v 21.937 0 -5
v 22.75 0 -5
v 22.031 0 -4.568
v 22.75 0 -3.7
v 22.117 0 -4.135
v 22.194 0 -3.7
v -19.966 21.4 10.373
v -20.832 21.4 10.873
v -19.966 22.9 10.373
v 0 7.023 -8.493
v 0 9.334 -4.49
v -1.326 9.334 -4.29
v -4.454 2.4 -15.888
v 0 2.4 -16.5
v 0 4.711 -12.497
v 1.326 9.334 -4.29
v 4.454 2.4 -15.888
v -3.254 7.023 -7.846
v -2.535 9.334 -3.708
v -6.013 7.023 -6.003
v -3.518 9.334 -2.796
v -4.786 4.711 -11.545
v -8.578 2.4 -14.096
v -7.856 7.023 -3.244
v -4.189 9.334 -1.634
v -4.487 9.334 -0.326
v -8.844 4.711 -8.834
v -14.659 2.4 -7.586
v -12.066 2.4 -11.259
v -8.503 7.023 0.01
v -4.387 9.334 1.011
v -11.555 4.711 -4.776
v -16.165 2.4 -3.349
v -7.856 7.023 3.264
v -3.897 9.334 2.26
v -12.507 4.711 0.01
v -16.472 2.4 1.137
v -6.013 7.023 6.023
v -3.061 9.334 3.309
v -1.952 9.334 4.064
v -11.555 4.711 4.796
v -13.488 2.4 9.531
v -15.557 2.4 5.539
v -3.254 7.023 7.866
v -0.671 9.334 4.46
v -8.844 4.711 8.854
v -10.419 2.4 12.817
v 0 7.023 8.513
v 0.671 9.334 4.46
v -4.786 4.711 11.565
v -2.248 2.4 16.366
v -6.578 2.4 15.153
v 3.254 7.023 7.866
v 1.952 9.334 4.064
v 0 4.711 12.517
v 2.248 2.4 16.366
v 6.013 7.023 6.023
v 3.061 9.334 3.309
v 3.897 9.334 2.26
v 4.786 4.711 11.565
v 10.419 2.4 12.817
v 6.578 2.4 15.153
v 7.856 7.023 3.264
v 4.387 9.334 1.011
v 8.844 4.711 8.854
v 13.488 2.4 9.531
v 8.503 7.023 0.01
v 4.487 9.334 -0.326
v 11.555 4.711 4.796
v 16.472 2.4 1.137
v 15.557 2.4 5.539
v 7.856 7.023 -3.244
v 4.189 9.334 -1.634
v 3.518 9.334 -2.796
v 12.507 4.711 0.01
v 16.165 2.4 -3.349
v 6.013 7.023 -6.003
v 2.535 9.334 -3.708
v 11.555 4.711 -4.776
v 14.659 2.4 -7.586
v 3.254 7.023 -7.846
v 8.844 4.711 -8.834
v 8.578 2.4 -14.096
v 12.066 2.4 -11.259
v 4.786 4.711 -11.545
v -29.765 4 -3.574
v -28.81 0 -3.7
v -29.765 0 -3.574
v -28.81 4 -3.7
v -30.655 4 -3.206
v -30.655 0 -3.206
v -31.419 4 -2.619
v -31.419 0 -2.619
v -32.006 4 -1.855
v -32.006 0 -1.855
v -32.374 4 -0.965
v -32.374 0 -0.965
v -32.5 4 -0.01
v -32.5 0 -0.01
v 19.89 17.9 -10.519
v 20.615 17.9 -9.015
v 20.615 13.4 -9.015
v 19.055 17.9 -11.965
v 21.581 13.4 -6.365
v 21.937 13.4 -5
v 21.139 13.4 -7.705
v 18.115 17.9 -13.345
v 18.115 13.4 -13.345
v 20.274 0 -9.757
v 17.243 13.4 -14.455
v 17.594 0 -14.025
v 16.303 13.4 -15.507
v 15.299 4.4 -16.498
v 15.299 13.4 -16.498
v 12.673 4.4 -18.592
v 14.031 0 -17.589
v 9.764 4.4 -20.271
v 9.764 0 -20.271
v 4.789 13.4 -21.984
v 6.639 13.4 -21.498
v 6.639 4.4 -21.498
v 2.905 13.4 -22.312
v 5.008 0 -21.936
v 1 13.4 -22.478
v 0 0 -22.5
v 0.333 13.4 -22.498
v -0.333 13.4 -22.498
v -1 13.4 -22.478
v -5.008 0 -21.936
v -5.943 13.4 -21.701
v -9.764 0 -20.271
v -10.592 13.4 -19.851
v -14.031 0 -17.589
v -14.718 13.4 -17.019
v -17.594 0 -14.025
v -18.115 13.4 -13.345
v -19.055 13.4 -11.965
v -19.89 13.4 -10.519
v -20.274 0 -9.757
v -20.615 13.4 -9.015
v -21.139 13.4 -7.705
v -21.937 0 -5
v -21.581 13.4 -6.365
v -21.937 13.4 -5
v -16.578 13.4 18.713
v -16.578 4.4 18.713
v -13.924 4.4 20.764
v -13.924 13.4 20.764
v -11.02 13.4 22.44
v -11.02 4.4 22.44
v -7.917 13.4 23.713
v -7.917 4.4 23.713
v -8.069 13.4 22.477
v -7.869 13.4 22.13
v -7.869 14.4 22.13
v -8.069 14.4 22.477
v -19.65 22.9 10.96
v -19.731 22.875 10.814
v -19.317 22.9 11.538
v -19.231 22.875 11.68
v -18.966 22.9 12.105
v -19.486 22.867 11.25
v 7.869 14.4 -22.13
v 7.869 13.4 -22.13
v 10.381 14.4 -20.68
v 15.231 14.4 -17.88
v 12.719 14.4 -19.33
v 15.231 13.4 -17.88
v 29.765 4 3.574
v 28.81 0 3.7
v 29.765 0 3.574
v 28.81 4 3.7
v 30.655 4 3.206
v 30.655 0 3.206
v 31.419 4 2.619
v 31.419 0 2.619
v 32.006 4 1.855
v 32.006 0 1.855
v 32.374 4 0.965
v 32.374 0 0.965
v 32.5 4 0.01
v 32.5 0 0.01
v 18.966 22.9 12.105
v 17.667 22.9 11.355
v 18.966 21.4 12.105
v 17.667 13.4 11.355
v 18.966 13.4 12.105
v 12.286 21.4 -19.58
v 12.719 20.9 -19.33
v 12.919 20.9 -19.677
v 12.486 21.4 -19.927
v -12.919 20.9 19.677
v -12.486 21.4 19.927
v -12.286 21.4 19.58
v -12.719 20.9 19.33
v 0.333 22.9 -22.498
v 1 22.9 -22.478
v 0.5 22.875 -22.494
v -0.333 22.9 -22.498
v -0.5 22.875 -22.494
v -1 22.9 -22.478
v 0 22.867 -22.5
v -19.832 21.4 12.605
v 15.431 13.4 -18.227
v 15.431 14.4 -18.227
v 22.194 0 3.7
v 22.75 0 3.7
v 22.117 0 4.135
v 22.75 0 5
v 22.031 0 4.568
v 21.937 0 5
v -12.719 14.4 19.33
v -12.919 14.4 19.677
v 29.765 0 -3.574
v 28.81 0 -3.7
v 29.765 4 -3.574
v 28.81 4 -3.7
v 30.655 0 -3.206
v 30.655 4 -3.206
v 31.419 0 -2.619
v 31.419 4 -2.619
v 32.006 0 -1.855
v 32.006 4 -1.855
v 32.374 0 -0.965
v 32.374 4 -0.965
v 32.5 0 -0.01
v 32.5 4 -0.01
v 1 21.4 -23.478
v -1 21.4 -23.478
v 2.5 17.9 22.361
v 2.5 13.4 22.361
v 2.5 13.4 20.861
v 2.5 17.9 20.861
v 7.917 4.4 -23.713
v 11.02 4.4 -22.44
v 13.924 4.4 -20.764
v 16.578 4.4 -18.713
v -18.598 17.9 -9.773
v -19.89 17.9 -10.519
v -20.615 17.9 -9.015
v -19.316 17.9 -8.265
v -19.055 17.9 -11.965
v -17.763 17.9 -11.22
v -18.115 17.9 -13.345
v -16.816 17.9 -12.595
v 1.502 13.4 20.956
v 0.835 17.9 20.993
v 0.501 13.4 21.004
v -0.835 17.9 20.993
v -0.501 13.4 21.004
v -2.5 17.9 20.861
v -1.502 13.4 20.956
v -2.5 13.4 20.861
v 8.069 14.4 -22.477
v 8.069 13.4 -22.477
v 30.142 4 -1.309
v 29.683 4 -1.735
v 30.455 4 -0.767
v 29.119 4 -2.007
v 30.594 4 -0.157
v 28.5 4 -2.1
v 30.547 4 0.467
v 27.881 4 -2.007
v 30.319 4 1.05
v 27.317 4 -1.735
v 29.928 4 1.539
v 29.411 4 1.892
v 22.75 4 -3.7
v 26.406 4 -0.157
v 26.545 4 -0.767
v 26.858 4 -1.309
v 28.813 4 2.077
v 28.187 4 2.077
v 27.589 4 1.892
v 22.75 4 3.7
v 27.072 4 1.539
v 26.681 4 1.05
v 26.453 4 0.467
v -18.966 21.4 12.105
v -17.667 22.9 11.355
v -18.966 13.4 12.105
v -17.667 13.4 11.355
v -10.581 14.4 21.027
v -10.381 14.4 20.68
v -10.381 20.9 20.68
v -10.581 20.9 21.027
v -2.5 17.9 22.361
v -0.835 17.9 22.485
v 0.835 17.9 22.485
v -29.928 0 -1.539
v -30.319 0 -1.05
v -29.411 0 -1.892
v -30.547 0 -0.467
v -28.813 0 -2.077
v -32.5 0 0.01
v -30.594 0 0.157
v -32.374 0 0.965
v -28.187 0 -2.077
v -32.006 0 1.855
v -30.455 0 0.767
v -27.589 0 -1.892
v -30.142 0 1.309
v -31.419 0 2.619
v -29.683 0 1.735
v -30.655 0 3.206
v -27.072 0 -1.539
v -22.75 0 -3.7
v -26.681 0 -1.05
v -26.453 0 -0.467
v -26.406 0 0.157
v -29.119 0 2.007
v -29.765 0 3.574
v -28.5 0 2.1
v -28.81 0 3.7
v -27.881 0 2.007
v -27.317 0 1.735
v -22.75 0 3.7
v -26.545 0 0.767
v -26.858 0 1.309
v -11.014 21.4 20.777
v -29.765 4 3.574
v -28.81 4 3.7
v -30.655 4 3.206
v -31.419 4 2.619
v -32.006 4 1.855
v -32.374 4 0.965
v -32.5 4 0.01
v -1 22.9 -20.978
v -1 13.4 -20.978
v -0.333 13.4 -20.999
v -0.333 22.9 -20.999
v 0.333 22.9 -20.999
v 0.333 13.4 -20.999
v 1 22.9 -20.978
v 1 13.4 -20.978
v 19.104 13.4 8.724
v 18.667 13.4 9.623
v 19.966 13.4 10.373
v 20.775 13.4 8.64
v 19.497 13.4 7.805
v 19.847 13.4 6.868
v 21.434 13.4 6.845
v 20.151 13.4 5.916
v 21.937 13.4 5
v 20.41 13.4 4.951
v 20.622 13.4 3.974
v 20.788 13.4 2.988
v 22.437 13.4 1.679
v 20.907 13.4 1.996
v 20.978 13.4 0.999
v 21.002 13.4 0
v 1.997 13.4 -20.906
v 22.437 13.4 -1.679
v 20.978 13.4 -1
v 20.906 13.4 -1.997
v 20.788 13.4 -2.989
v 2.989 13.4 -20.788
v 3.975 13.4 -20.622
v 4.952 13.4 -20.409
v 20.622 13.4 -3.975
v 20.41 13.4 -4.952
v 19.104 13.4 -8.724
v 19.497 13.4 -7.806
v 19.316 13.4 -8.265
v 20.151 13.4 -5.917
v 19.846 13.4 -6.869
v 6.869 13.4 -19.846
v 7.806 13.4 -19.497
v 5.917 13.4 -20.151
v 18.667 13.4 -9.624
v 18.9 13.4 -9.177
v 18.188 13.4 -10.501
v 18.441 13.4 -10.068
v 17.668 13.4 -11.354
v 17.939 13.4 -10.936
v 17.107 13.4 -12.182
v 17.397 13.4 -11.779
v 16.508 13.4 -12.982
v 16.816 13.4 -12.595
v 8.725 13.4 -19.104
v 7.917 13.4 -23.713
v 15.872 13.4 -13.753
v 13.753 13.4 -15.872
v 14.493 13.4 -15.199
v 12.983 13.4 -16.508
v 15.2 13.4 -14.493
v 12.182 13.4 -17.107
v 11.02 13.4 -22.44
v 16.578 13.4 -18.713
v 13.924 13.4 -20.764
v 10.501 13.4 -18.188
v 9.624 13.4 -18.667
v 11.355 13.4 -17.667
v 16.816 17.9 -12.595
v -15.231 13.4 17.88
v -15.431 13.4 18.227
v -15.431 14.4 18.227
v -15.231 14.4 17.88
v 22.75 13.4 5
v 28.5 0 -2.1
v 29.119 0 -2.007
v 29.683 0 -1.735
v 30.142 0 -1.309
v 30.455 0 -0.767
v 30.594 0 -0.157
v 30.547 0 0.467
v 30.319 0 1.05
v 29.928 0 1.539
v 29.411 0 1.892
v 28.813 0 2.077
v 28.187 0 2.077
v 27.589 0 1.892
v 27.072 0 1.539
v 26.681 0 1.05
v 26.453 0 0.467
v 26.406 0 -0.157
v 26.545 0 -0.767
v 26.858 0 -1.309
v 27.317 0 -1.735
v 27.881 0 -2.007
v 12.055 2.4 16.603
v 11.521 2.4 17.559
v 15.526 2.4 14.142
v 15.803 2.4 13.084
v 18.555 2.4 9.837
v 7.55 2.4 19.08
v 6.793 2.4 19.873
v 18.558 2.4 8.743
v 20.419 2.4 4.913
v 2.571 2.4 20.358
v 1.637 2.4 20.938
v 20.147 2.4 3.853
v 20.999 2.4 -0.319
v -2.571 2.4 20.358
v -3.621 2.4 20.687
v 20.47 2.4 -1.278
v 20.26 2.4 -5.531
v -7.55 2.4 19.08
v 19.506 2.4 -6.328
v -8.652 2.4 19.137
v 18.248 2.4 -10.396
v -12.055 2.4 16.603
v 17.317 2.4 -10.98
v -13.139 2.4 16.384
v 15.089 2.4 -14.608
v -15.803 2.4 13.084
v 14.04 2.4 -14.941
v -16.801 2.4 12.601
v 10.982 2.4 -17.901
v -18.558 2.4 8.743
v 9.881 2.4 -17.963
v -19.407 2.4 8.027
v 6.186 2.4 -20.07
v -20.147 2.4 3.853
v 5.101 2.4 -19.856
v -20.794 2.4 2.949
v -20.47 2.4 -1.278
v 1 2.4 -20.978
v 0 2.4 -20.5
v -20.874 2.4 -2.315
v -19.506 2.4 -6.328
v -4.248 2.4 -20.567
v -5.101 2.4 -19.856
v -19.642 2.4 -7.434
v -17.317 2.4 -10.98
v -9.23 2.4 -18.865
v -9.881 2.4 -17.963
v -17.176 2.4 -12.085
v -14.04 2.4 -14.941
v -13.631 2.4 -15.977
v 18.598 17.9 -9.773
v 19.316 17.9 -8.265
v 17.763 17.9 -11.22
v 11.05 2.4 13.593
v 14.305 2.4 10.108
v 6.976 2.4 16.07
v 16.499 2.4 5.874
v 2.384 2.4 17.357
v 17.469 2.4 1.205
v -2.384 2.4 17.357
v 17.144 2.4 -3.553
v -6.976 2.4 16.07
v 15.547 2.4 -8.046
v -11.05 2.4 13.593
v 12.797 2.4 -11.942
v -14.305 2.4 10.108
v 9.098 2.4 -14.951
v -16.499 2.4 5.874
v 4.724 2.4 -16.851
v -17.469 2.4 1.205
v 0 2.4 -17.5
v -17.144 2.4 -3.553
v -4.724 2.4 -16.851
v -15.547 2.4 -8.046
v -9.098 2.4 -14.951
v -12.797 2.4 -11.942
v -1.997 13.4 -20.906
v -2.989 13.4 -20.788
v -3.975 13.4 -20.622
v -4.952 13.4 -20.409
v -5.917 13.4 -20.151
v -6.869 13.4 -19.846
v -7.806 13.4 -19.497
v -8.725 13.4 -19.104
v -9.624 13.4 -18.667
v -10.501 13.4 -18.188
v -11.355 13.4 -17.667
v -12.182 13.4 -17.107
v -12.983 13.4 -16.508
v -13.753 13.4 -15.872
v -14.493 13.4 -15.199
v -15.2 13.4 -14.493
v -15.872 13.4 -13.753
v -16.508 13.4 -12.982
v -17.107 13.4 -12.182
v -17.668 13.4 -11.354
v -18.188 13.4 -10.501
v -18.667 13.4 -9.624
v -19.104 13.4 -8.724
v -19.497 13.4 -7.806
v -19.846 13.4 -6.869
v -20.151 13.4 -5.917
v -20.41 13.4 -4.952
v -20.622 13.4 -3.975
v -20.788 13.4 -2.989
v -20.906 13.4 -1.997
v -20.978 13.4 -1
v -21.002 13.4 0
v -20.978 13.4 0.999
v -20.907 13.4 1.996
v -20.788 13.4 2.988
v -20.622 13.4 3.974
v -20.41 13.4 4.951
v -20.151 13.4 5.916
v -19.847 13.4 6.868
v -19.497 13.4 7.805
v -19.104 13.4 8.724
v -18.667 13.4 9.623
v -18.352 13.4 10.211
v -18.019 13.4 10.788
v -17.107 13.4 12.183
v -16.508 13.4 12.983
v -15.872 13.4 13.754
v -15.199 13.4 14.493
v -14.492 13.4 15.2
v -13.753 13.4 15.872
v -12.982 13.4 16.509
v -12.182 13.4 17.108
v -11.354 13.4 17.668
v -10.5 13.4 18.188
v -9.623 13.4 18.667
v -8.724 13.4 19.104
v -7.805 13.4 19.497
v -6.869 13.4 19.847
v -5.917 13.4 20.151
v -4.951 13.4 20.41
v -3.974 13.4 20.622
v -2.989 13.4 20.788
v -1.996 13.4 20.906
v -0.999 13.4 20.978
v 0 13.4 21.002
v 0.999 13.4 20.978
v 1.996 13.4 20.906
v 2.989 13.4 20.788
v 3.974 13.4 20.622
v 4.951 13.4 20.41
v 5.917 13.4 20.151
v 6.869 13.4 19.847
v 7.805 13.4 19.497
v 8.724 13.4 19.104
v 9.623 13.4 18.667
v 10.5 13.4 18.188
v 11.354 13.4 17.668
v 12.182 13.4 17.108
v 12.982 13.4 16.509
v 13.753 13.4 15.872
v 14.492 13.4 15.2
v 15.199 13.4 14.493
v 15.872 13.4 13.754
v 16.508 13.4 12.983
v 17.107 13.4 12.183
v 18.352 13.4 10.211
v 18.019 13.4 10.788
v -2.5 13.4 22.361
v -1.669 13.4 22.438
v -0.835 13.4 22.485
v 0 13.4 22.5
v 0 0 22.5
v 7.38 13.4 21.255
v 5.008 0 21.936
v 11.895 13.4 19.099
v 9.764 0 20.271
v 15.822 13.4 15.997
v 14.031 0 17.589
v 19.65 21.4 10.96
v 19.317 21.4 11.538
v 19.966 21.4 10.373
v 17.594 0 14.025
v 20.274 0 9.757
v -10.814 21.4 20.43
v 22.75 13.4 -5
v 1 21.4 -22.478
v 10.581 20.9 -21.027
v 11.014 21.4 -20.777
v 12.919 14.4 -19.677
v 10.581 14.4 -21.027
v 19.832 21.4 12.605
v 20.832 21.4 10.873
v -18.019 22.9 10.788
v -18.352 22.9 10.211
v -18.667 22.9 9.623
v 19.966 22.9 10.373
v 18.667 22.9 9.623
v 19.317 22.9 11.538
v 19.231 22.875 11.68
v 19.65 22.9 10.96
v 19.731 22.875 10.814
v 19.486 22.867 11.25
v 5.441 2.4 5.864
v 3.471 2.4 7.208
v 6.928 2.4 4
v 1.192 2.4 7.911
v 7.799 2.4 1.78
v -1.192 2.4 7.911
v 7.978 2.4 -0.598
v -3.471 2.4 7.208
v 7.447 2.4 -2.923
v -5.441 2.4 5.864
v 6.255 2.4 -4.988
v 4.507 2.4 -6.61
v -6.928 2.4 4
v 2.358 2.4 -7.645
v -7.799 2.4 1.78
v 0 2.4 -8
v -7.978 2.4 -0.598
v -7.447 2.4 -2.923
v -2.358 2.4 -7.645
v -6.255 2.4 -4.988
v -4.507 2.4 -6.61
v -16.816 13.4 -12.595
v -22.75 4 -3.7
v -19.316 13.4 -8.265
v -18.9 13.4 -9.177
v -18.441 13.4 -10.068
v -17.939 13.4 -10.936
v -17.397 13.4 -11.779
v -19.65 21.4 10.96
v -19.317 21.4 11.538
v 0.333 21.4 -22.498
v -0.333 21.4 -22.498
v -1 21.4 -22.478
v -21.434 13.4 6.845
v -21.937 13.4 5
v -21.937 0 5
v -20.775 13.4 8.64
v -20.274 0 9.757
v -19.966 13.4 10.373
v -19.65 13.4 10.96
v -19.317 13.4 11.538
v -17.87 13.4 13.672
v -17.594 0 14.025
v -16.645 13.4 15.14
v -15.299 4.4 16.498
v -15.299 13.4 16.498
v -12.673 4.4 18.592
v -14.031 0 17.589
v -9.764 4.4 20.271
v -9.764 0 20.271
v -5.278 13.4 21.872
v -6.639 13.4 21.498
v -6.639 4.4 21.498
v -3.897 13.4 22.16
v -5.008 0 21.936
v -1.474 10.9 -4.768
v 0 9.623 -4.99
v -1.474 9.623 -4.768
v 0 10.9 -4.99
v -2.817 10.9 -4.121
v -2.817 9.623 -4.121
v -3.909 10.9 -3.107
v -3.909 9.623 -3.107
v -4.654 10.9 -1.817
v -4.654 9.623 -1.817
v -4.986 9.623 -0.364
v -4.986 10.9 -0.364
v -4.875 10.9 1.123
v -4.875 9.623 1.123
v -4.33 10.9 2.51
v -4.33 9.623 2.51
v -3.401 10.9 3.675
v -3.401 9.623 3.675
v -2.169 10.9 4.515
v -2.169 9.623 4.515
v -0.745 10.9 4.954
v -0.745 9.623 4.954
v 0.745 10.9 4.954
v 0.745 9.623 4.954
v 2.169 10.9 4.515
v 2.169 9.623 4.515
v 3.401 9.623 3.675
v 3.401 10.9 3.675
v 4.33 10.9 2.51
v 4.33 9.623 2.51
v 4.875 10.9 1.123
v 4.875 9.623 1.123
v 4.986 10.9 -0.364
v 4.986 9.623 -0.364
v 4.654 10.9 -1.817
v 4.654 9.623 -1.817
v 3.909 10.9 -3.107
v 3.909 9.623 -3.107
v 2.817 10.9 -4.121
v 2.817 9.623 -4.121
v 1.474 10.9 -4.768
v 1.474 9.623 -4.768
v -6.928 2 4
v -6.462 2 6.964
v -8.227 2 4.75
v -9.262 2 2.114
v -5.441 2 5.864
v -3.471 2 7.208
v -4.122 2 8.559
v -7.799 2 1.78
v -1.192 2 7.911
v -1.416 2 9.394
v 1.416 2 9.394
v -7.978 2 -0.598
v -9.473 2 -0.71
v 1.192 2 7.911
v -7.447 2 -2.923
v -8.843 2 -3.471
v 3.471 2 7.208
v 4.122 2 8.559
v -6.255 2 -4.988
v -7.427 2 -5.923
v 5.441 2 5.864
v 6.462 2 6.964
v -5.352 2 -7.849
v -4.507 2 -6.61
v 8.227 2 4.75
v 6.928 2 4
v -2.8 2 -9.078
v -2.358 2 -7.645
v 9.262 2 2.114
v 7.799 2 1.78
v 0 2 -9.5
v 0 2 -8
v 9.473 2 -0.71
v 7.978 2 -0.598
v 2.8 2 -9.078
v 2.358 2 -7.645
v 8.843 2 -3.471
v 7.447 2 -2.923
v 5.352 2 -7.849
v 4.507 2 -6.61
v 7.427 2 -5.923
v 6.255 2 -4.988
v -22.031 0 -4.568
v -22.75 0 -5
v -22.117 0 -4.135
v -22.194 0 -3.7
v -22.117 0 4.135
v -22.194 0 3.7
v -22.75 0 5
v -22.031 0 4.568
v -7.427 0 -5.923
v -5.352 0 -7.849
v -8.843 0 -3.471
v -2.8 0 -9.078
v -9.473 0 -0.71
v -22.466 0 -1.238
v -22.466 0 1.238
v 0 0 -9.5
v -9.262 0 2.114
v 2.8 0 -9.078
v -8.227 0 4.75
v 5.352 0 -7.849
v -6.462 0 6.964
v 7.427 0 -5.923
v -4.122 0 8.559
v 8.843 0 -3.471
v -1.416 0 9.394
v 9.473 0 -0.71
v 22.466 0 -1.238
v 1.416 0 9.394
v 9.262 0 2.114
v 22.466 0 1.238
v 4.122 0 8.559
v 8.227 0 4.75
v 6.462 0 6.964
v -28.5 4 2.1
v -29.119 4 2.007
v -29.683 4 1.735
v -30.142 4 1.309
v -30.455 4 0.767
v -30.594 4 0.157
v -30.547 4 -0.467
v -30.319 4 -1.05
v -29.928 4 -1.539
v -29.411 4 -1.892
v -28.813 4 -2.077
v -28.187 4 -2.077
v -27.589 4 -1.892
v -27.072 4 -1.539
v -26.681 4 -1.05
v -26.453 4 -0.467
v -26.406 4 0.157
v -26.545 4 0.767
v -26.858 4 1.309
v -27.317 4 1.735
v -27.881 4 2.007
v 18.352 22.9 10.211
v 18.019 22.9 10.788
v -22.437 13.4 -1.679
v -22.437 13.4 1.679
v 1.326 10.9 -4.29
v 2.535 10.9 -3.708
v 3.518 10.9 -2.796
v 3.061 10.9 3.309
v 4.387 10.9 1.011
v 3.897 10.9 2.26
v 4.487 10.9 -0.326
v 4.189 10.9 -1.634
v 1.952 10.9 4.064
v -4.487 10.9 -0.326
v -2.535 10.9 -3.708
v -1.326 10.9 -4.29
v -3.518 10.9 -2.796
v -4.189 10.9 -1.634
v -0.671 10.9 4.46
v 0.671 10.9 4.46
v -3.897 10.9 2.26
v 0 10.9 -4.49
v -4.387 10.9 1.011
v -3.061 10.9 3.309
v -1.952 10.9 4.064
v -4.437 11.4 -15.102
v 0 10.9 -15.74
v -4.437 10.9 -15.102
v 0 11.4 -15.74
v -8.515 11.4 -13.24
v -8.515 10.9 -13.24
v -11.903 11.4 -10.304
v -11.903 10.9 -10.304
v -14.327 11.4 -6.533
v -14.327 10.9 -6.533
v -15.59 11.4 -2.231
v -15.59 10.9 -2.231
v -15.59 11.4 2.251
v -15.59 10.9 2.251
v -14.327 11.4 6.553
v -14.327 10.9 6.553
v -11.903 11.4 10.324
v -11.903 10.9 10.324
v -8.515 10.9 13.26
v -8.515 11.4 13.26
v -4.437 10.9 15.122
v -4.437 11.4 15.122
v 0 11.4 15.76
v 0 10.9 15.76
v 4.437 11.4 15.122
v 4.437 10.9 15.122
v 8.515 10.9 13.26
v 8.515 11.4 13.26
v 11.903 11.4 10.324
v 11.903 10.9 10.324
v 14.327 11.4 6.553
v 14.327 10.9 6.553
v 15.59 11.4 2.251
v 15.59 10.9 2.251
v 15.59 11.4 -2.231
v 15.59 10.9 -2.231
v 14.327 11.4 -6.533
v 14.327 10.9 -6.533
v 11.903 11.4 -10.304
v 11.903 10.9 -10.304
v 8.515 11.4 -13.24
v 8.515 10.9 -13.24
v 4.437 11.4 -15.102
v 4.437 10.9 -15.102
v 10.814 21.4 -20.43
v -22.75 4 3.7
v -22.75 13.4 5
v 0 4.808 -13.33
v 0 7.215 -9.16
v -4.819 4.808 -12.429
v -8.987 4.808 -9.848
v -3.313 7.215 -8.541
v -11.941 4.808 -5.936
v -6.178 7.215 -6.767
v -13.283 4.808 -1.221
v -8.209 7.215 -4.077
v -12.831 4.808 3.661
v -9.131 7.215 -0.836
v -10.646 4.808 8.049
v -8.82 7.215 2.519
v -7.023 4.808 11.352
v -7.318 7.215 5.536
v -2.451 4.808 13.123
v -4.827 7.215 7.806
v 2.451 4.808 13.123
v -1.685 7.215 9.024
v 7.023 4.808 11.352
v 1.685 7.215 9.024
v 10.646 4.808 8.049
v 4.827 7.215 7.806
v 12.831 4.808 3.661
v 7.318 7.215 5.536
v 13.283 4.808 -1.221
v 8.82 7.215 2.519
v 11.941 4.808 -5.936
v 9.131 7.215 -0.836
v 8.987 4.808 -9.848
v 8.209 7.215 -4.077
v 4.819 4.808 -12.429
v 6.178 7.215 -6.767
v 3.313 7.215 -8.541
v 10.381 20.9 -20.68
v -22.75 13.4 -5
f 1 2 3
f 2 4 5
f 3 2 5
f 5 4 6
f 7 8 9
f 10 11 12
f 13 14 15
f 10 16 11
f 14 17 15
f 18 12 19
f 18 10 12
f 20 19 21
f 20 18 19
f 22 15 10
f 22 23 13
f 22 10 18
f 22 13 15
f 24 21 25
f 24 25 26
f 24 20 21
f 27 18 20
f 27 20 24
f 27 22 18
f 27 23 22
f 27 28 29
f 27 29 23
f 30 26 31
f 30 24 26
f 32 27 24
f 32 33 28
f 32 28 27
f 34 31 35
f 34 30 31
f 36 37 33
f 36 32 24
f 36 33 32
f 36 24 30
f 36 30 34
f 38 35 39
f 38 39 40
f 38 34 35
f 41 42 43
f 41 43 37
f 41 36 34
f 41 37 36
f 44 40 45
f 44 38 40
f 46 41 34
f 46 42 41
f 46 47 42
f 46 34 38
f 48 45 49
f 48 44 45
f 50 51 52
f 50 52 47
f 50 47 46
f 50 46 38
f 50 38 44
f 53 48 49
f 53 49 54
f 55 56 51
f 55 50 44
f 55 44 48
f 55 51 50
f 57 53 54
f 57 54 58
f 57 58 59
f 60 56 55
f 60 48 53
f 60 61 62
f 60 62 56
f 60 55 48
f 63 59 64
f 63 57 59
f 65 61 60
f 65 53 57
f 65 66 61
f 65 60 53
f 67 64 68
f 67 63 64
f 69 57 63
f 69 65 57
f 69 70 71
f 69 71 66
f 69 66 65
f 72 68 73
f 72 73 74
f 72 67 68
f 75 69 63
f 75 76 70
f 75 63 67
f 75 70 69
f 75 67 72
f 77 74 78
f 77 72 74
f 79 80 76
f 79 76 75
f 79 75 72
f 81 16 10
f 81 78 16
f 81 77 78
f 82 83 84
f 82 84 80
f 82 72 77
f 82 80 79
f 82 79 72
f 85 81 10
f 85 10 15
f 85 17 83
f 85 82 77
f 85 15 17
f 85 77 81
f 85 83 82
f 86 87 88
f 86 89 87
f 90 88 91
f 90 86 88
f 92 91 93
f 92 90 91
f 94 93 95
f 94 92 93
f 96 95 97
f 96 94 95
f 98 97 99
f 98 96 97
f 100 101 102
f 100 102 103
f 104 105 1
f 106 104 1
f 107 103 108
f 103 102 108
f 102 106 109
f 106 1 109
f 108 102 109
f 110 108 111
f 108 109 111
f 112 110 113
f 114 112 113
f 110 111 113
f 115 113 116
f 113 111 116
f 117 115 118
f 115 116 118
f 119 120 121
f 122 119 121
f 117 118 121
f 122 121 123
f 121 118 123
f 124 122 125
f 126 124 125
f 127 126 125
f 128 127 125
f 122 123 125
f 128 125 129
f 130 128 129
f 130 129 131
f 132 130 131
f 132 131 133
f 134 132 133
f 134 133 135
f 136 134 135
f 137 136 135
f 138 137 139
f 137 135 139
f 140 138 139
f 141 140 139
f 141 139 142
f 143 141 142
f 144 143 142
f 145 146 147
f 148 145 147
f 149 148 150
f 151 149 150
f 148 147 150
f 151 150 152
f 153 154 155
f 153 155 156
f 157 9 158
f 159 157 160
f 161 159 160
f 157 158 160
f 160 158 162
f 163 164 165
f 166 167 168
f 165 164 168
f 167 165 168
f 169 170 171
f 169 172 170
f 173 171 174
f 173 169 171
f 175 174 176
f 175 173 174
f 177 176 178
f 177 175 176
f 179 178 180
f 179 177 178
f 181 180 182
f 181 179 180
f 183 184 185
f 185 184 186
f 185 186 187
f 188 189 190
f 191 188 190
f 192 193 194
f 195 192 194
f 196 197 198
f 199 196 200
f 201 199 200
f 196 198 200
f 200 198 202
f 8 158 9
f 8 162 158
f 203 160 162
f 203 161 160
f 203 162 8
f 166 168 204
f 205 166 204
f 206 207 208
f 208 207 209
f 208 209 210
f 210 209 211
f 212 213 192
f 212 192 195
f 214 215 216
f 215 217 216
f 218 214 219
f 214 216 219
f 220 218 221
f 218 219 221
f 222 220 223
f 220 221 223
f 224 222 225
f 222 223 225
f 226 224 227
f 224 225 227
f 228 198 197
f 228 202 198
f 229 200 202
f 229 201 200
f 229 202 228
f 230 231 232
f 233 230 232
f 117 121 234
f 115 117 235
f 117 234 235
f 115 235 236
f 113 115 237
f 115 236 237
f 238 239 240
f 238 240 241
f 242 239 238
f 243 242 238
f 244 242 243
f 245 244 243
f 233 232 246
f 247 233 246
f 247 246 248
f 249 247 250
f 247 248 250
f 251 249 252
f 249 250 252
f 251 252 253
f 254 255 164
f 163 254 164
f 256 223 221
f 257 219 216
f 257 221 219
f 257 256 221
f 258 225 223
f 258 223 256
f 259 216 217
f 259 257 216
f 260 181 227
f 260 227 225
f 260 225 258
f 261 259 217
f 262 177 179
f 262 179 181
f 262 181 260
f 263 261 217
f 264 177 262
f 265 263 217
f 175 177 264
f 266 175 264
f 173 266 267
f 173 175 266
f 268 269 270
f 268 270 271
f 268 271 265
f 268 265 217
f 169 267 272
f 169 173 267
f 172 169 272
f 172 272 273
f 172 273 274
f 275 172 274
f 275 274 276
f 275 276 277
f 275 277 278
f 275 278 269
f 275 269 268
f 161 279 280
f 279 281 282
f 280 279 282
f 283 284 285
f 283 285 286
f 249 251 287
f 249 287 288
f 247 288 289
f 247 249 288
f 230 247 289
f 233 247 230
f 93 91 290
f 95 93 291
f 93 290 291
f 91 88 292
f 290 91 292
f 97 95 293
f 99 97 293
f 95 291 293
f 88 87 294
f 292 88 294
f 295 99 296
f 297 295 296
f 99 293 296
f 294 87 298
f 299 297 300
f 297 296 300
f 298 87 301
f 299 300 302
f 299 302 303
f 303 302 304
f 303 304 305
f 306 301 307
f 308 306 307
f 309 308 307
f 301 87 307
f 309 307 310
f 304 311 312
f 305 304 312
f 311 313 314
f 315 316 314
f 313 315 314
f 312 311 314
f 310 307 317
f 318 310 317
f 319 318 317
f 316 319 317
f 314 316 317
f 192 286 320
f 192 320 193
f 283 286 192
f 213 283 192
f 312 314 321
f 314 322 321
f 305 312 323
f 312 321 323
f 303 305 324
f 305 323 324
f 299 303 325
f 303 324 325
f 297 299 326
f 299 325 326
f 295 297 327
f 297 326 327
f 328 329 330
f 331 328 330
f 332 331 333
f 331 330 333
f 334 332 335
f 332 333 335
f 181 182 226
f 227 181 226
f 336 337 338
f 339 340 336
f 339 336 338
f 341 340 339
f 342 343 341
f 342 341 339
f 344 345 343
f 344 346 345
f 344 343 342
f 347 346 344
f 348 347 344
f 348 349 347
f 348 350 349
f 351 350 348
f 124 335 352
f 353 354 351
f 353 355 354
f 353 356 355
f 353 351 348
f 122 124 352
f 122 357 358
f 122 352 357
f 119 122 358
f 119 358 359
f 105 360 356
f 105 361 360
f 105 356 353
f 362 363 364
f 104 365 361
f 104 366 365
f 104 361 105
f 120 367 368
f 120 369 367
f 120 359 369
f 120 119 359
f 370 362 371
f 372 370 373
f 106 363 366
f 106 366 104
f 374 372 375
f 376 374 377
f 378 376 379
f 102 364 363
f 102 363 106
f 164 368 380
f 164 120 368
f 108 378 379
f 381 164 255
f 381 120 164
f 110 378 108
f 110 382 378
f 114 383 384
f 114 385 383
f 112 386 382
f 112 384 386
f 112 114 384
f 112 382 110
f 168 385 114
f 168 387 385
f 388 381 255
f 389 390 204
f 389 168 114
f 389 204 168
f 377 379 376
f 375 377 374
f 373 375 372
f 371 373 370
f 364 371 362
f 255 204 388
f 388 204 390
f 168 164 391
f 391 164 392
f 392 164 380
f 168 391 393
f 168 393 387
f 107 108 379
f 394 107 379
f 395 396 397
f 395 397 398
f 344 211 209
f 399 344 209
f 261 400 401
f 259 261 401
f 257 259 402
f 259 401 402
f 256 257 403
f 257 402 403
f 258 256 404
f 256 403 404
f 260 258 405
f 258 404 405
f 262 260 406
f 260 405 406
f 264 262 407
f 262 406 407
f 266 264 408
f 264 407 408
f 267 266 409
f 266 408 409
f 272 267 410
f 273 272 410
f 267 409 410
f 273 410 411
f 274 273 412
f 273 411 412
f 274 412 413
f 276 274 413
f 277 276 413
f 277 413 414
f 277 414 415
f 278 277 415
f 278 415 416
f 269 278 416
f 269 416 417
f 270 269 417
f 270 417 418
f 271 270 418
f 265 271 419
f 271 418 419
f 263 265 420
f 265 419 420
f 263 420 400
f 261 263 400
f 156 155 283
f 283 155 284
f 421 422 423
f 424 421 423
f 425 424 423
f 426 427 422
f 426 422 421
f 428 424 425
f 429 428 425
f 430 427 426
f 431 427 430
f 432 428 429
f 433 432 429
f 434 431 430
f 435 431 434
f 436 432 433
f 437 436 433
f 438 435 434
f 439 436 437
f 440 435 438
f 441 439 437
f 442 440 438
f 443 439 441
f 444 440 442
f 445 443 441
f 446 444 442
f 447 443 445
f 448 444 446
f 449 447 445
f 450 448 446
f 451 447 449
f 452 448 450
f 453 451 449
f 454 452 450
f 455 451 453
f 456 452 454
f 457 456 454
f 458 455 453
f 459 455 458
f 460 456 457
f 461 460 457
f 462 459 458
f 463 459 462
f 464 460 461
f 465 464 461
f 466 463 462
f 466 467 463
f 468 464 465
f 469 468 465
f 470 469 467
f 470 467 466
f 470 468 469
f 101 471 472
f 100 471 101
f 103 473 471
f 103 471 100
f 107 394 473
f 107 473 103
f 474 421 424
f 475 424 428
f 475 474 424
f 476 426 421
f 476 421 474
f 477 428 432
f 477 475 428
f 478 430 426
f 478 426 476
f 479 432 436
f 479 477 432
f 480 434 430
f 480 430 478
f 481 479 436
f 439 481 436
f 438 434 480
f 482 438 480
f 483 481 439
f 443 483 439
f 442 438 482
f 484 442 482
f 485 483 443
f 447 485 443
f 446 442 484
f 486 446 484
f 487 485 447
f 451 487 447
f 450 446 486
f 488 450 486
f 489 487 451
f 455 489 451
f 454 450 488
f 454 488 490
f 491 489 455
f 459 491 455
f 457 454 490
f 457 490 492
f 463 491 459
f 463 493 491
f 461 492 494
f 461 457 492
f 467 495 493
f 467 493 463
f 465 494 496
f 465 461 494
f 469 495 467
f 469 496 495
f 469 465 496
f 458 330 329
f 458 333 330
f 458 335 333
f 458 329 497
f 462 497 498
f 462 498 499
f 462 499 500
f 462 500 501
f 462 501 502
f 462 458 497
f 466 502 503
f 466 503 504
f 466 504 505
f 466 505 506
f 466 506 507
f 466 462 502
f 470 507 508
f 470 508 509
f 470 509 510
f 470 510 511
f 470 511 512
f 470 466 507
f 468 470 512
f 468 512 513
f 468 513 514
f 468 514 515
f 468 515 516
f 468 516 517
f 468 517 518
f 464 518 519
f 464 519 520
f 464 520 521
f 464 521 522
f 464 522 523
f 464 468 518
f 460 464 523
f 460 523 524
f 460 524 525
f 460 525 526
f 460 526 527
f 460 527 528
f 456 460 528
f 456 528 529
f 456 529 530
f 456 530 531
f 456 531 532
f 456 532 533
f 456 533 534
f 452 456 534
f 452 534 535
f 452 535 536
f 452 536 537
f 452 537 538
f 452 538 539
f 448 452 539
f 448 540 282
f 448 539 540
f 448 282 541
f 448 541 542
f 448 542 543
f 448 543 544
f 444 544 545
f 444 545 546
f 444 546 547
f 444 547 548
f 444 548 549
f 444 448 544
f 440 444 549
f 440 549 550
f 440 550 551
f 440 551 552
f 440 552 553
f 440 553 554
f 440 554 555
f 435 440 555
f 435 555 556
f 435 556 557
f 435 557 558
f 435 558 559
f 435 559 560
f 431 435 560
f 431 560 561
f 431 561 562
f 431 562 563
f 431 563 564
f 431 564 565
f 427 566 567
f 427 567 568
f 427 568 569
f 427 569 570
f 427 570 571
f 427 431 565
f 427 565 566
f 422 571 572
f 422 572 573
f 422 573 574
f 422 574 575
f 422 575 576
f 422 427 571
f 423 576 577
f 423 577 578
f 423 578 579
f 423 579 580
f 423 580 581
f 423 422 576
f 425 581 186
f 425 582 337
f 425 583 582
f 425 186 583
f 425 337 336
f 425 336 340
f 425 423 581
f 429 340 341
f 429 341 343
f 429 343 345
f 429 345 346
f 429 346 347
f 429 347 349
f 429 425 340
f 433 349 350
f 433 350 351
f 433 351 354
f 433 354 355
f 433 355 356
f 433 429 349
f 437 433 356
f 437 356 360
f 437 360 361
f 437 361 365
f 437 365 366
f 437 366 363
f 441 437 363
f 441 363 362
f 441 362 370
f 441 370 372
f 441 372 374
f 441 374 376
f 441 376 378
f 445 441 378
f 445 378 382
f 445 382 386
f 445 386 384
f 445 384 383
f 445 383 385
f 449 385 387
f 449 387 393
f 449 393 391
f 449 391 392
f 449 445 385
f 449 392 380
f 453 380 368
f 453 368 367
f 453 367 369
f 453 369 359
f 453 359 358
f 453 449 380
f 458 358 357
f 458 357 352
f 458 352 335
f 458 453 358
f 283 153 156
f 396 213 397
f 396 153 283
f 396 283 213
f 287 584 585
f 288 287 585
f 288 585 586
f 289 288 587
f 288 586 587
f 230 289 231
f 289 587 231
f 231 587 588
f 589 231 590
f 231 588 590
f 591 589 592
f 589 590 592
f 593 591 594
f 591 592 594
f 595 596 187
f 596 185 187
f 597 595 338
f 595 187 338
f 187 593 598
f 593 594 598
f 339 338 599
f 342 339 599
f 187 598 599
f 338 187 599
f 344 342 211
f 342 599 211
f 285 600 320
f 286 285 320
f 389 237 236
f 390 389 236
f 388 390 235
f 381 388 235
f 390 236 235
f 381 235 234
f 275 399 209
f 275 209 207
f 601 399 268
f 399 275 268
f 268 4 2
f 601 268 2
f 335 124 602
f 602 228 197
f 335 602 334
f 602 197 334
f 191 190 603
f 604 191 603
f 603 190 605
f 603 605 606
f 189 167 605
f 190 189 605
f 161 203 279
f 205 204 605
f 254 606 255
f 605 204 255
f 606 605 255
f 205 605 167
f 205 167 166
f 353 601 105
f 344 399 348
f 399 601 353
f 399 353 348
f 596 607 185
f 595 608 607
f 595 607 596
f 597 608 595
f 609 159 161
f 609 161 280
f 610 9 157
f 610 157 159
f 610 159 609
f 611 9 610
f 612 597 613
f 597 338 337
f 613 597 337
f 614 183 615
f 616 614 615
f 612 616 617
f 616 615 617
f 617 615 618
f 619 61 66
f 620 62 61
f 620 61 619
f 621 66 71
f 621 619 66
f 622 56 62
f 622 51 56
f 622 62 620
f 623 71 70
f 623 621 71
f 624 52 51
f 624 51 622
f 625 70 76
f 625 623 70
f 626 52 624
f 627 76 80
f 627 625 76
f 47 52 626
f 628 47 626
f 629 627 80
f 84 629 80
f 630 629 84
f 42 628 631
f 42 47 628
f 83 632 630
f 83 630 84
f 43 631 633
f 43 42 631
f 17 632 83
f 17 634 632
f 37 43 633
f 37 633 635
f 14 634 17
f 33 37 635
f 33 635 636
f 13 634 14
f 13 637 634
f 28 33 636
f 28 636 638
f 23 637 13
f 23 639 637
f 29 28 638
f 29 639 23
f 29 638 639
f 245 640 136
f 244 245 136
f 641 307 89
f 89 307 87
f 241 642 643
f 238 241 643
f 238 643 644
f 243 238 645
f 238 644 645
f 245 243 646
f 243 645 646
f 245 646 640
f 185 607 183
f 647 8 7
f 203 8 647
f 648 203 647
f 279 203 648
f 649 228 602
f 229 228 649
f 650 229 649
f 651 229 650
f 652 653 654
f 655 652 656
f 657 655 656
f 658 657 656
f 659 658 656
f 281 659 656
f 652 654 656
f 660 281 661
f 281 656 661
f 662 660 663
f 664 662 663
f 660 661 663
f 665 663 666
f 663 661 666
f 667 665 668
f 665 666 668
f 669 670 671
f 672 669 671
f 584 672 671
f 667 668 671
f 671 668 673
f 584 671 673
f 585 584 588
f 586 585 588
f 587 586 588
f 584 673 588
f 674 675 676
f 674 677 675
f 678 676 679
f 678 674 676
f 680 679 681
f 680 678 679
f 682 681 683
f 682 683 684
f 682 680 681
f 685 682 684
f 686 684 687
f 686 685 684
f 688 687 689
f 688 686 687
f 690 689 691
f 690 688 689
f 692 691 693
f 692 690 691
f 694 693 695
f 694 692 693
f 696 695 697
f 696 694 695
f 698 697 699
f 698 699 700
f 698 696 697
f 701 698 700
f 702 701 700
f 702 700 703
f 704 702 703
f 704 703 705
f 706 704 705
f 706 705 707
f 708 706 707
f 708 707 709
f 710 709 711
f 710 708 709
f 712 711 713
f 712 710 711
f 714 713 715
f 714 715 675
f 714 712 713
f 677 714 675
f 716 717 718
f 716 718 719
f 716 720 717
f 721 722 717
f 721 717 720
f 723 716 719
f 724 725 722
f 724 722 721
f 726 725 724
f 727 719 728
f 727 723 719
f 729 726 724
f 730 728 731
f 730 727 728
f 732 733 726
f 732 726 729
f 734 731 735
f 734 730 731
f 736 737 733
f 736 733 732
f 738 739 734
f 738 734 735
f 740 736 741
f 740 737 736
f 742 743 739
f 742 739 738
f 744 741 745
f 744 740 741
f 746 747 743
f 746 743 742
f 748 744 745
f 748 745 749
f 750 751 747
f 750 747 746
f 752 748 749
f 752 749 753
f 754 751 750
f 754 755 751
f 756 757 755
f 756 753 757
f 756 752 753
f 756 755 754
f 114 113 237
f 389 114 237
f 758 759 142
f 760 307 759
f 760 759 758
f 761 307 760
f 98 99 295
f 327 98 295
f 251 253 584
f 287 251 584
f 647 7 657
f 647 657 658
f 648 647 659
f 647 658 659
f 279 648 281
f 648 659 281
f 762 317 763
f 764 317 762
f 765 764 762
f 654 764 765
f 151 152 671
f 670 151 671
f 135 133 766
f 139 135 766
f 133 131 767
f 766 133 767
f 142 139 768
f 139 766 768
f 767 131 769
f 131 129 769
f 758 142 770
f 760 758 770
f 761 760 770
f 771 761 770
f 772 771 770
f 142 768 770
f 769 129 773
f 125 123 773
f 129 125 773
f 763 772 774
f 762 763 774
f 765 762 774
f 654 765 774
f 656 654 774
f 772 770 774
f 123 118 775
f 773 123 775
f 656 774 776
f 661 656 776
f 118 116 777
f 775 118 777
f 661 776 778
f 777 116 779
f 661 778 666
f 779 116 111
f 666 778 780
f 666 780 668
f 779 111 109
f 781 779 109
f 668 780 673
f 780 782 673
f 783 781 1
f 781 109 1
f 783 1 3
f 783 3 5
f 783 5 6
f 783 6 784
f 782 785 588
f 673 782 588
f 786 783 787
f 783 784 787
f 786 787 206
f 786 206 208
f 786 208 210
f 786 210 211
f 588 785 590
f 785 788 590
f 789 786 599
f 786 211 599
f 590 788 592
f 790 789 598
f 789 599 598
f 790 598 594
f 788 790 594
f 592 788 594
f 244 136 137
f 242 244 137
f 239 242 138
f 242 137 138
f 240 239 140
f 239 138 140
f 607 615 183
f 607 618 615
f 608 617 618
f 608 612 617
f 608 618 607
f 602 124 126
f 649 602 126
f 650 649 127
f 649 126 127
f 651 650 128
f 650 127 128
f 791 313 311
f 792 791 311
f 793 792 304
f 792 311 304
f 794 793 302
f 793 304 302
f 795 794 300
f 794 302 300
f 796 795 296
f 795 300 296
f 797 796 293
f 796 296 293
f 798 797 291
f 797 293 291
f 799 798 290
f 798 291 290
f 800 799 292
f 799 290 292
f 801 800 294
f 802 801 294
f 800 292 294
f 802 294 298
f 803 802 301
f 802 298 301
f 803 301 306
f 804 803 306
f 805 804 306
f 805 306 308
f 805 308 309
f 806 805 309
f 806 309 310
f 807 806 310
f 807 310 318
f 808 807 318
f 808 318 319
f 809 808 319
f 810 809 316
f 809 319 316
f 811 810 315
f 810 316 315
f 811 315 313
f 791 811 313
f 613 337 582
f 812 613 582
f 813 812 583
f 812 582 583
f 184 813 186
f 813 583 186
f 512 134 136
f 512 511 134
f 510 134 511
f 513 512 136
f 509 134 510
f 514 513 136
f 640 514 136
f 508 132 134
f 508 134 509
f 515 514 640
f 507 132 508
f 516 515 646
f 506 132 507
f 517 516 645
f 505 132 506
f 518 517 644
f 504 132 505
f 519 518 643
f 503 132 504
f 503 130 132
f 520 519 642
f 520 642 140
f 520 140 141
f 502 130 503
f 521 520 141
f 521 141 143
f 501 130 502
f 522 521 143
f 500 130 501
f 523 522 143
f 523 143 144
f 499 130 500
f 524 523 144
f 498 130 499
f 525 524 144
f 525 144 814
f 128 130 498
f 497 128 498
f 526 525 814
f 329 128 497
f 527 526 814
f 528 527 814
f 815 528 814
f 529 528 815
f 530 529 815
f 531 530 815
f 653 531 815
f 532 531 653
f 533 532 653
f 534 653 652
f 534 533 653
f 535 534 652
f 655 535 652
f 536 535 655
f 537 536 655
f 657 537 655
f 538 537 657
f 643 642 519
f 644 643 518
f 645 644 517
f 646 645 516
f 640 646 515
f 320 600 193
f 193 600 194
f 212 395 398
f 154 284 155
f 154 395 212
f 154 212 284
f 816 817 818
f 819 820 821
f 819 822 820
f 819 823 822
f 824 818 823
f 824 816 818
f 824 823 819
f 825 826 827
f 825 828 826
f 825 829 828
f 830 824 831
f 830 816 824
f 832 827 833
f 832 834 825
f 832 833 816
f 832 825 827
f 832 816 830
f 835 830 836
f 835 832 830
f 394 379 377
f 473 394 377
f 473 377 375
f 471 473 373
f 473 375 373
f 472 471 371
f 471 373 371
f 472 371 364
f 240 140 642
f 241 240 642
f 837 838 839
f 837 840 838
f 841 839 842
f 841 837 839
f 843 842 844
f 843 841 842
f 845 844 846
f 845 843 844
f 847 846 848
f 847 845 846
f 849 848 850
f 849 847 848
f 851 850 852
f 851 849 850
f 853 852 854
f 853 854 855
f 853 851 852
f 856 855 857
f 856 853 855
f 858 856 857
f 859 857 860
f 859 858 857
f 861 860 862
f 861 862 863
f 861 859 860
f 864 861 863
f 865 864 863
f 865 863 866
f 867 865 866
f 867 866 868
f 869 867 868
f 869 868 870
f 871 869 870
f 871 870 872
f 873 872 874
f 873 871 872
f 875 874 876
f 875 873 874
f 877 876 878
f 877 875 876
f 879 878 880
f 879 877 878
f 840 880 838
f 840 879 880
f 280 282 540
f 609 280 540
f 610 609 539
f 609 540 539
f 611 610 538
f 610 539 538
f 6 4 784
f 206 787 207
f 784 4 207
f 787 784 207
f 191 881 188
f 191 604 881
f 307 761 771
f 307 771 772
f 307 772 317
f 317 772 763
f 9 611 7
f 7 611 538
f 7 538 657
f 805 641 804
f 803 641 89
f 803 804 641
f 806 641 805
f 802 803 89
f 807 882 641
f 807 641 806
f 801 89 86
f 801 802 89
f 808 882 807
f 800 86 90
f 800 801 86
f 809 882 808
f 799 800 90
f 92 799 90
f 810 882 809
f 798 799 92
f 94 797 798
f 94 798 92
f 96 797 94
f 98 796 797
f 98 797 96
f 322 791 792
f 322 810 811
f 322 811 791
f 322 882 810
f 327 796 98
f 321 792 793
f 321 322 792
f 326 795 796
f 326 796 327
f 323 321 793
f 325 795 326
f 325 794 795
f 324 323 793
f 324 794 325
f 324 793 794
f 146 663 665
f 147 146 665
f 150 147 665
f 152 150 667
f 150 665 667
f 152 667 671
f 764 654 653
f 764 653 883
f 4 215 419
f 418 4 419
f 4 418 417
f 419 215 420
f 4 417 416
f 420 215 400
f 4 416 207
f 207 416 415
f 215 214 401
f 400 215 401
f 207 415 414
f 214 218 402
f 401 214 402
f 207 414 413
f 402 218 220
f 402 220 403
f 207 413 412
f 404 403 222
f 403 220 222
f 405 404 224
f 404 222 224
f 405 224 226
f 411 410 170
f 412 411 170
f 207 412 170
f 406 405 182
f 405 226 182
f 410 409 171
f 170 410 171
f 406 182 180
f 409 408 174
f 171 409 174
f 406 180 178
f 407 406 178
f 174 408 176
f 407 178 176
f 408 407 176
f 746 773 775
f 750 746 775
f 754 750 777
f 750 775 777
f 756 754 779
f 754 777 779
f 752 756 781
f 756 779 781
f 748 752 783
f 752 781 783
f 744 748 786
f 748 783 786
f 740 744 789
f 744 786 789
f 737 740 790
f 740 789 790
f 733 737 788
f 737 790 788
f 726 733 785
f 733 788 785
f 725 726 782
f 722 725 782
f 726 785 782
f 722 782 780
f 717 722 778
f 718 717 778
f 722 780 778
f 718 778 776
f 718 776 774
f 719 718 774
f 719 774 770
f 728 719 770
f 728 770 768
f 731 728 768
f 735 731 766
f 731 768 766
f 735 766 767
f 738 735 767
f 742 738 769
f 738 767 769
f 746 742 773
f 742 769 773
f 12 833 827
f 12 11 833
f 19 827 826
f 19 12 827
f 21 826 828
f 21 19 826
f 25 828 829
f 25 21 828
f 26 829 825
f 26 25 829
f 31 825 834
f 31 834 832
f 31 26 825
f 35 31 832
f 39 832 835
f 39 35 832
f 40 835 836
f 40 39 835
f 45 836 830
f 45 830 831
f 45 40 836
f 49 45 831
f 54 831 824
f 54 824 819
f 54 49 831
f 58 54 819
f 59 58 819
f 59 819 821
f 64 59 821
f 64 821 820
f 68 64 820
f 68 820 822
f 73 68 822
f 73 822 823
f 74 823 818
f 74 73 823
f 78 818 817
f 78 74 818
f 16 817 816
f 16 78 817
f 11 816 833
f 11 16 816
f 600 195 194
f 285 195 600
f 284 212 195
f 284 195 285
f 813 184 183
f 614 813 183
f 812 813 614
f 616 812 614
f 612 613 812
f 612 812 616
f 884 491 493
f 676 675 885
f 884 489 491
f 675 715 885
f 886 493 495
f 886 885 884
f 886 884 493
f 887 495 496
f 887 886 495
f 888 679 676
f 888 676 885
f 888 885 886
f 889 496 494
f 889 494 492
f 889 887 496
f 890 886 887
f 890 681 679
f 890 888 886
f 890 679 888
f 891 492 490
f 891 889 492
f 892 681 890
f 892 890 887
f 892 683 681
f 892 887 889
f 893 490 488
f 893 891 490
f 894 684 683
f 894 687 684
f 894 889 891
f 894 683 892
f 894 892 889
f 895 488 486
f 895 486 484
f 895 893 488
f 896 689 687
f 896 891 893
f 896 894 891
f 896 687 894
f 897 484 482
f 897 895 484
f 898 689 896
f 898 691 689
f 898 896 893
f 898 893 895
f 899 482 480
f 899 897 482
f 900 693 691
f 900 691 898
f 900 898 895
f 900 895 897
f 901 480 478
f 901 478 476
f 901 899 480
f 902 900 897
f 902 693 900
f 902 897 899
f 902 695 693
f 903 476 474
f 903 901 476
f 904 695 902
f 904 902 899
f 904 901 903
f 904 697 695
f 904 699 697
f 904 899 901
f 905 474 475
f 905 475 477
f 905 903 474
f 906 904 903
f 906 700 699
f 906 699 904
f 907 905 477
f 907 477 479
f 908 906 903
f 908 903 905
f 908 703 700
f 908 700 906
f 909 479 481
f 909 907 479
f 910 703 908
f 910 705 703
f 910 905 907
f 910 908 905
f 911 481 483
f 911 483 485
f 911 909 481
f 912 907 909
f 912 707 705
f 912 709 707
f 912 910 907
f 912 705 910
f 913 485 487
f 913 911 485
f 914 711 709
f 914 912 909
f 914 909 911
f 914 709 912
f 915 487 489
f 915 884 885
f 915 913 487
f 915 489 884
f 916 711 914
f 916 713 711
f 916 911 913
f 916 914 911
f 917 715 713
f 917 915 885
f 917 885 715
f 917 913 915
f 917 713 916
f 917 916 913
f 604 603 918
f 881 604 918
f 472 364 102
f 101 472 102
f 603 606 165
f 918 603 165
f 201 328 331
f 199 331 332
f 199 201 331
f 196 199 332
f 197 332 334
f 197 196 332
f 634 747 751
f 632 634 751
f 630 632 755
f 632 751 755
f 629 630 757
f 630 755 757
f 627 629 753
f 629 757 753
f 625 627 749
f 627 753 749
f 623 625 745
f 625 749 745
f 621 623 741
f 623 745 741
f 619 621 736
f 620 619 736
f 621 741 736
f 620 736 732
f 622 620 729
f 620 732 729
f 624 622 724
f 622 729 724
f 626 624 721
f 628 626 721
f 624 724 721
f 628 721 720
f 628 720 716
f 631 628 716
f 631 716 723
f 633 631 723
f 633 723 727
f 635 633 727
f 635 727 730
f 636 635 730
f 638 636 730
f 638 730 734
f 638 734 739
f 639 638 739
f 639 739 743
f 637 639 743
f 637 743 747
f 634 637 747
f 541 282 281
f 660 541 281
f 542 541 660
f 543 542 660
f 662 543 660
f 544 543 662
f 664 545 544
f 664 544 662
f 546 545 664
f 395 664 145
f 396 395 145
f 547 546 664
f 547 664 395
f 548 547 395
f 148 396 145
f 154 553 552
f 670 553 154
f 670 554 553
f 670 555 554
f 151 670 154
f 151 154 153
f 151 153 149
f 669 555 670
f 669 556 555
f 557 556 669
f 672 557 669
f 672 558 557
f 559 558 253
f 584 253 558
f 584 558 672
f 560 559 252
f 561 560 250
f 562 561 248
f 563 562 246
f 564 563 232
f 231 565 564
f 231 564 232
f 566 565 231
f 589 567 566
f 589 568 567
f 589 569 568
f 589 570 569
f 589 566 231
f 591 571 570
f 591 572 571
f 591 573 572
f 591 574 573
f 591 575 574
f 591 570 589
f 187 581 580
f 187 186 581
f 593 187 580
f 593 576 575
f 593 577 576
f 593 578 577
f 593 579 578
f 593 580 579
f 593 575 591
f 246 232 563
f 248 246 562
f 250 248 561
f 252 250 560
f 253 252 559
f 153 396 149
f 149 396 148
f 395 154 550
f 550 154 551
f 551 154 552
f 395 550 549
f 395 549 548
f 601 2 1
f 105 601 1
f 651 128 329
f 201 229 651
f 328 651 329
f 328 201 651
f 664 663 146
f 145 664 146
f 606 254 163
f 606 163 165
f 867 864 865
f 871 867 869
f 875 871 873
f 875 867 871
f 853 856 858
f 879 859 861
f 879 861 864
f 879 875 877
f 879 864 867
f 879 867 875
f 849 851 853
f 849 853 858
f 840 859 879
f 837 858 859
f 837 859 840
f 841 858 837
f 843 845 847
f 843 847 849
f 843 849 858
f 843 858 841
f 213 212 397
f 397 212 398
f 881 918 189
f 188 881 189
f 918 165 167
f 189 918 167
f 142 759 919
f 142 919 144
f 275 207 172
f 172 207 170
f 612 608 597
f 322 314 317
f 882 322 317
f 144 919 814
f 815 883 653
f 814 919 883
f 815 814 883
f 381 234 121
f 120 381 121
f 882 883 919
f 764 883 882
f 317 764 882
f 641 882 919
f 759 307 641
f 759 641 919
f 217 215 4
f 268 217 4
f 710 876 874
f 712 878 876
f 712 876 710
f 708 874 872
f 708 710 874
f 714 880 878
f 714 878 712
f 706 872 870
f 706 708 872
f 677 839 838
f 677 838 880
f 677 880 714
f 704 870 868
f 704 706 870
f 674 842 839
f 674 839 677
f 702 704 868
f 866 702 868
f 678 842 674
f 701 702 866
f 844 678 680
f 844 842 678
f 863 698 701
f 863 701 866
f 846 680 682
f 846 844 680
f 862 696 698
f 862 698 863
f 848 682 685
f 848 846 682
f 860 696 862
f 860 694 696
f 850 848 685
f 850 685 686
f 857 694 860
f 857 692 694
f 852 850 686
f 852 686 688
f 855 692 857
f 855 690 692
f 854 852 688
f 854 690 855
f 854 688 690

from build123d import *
from build123d.topology import SkipClean

# Parameters (mm, degrees)
SKETCH_1_R               = 22.5
EXTRUDE_1_DEPTH          = 13.4
SKETCH_2_R               = 2.1
EXTRUDE_2_DEPTH          = 4
FILLET_1_R               = 3.69
EXTRUDE_3_DEPTH          = 9.5
EXTRUDE_5_DEPTH          = 2
EXTRUDE_4_DEPTH          = 4.5
CUT_EXTRUDE_START        = -11
SKETCH_5_R               = 21.001588026
CUT_EXTRUDE_1_DEPTH      = 11
SKETCH_6_R               = 8
CUT_EXTRUDE_2_DEPTH      = 3
PATTERN_CIRCULAR_1_COUNT = 3
EXTRUDE_START            = -9
EXTRUDE_6_DEPTH          = 9
EXTRUDE_7_DEPTH          = 1
EXTRUDE_8_DEPTH          = 7
CHAMFER_1_SIZE           = 0.5
SKETCH_13_R              = 9.5
CUT_EXTRUDE_4_DEPTH      = 2
EXTRUDE_10_DEPTH         = 13.4


with BuildPart() as part:
    # Sketch 1 → Extrude 1 (new body)
    with BuildSketch(Plane(origin=(0, 0, 0), x_dir=(1, 0, 0), z_dir=(0, 1, 0))):
        with Locations(Location((0, 0, 0), (0, 0, 270))):
            Circle(SKETCH_1_R)
    extrude(amount=EXTRUDE_1_DEPTH)

    # Sketch 2 → Extrude 2 (add)
    # profile 1 of 2: a face of its own
    with BuildSketch(Plane.XZ):
        with BuildLine():
            Line((22.193692798, 3.7), (32.5, 3.7))
            Line((32.5, 3.7), (32.5, -3.7))
            Line((32.5, -3.7), (22.193692798, -3.7))
            ThreePointArc((22.193692798, -3.7), (22.5, 0), (22.193692798, 3.7))
        make_face()
        with Locations(Location((28.5, 0, 0), (0, 0, 270))):
            Circle(SKETCH_2_R, mode=Mode.SUBTRACT)
    # profile 2 of 2: a face of its own
    with BuildSketch(Plane.XZ):
        with BuildLine():
            Line((-22.193692798, -3.7), (-32.5, -3.7))
            Line((-32.5, -3.7), (-32.5, 3.7))
            Line((-32.5, 3.7), (-22.193692798, 3.7))
            ThreePointArc((-22.193692798, 3.7), (-22.5, 0), (-22.193692798, -3.7))
        make_face()
        with Locations(Location((-28.5, 0, 0), (0, 0, 90))):
            Circle(SKETCH_2_R, mode=Mode.SUBTRACT)
    extrude(amount=-EXTRUDE_2_DEPTH)

    # Fillet 1
    fillet_1_edges = [part.edges().sort_by_distance(p)[0] for p in [
        (-32.5, 2, -3.7),
        (-32.5, 2, 3.7),
        (32.5, 2, 3.7),
        (32.5, 2, -3.7),
    ]]
    fillet(fillet_1_edges, radius=FILLET_1_R)

    # Sketch 3 → Extrude 3 (add)
    with BuildSketch(Plane(origin=(0, 13.4, 0), x_dir=(1, 0, 0), z_dir=(0, 1, 0))):
        with BuildLine():
            Line((-1, 22.477766793), (-1, 20.977766793))
            ThreePointArc((-1, 20.977766793), (0, 21.001588026), (1, 20.977766793))
            Line((1, 20.977766793), (1, 22.477766793))
            ThreePointArc((1, 22.477766793), (0, 22.5), (-1, 22.477766793))
        make_face()
        with BuildLine():
            Line((19.966317063, -10.372857993), (18.667278957, -9.622857993))
            ThreePointArc((18.667278957, -9.622857993), (18.18790875, -10.500794013), (17.667278957, -11.3549088))
            Line((17.667278957, -11.3549088), (18.966317063, -12.1049088))
            ThreePointArc((18.966317063, -12.1049088), (19.485571585, -11.25), (19.966317063, -10.372857993))
        make_face()
        with BuildLine():
            Line((-18.966317063, -12.1049088), (-17.667278957, -11.3549088))
            ThreePointArc((-17.667278957, -11.3549088), (-18.18790875, -10.500794013), (-18.667278957, -9.622857993))
            Line((-18.667278957, -9.622857993), (-19.966317063, -10.372857993))
            ThreePointArc((-19.966317063, -10.372857993), (-19.485571585, -11.25), (-18.966317063, -12.1049088))
        make_face()
    extrude(amount=EXTRUDE_3_DEPTH)

    # Sketch 7 → Extrude 5 (add)
    with BuildSketch(Plane.ZY.offset(1)):
        Polygon((-22.477766793, 22.9), (-23.477766793, 21.4), (-22.477766793, 21.4), align=None)
    extrude_5 = extrude(amount=-EXTRUDE_5_DEPTH)

    # Sketch 4 → Extrude 4 (add)
    with BuildSketch(Plane(origin=(0, 13.4, 0), x_dir=(1, 0, 0), z_dir=(0, 1, 0))):
        with BuildLine():
            Line((-2.5, -20.860679775), (-2.5, -22.360679775))
            ThreePointArc((-2.5, -22.360679775), (0, -22.5), (2.5, -22.360679775))
            Line((2.5, -22.360679775), (2.5, -20.860679775))
            ThreePointArc((2.5, -20.860679775), (0, -21.009949088), (-2.5, -20.860679775))
        make_face()
        with BuildLine():
            Line((-16.815878625, 12.595403397), (-18.114916731, 13.345403397))
            ThreePointArc((-18.114916731, 13.345403397), (-19.485571585, 11.25), (-20.614916731, 9.015276378))
            Line((-20.614916731, 9.015276378), (-19.315878625, 8.265276378))
            ThreePointArc((-19.315878625, 8.265276378), (-18.195149642, 10.504974544), (-16.815878625, 12.595403397))
        make_face()
        with BuildLine():
            Line((19.315878625, 8.265276378), (20.614916731, 9.015276378))
            ThreePointArc((20.614916731, 9.015276378), (19.485571585, 11.25), (18.114916731, 13.345403397))
            Line((18.114916731, 13.345403397), (16.815878625, 12.595403397))
            ThreePointArc((16.815878625, 12.595403397), (18.195149642, 10.504974544), (19.315878625, 8.265276378))
        make_face()
    extrude(amount=EXTRUDE_4_DEPTH)

    # Sketch 5 → Cut-Extrude 1 (cut)
    with SkipClean():  # the faces are left unmerged after this step: merging them gives an invalid solid
        with BuildSketch(Plane(origin=(0, 13.4, 0), x_dir=(1, 0, 0), z_dir=(0, 1, 0)).offset(CUT_EXTRUDE_START)):
            with Locations(Location((0, 0, 0), (0, 0, 87.270803902))):
                Circle(SKETCH_5_R)
        extrude(amount=CUT_EXTRUDE_1_DEPTH, mode=Mode.SUBTRACT)

    # Sketch 6 → Cut-Extrude 2 (cut)
    with SkipClean():  # the faces are left unmerged after this step: merging them gives an invalid solid
        with BuildSketch(Plane(origin=(0, 0, 0), x_dir=(-1, 0, 0), z_dir=(0, -1, 0))):
            with Locations(Location((0, 0, 0), (0, 0, 90))):
                Circle(SKETCH_6_R)
        extrude(amount=-CUT_EXTRUDE_2_DEPTH, mode=Mode.SUBTRACT)

    # Pattern Circular 1: Extrude 5 ×3 about axis
    with SkipClean():  # the faces are left unmerged after this step: merging them gives an invalid solid
        pattern_circular_1_axis = Axis((0, 0, 0), (0, 1, 0))
        for i in range(1, PATTERN_CIRCULAR_1_COUNT):
            add(extrude_5.rotate(pattern_circular_1_axis, i * 360 / PATTERN_CIRCULAR_1_COUNT))

    # Sketch 8 → Extrude 6 (add)
    with SkipClean():  # the faces are left unmerged after this step: merging them gives an invalid solid
        with BuildSketch(Plane(origin=(0, 13.4, 0), x_dir=(1, 0, 0), z_dir=(0, 1, 0)).offset(EXTRUDE_START)):
            with BuildLine():
                Line((7.917321695, 23.713203436), (6.638578465, 21.498355192))
                ThreePointArc((6.638578465, 21.498355192), (11.25, 19.485571585), (15.298832503, 16.498355192))
                Line((15.298832503, 16.498355192), (16.577575733, 18.713203436))
                ThreePointArc((16.577575733, 18.713203436), (12.5, 21.650635095), (7.917321695, 23.713203436))
            make_face()
            with BuildLine():
                Line((-7.917321695, -23.713203436), (-6.638578465, -21.498355192))
                ThreePointArc((-6.638578465, -21.498355192), (-11.25, -19.485571585), (-15.298832503, -16.498355192))
                Line((-15.298832503, -16.498355192), (-16.577575733, -18.713203436))
                ThreePointArc((-16.577575733, -18.713203436), (-12.5, -21.650635095), (-7.917321695, -23.713203436))
            make_face()
        extrude(amount=EXTRUDE_6_DEPTH)

    # Sketch 9 → Extrude 7 (add)
    with SkipClean():  # the faces are left unmerged after this step: merging them gives an invalid solid
        with BuildSketch(Plane(origin=(0, 13.4, 0), x_dir=(1, 0, 0), z_dir=(0, 1, 0))):
            Polygon((8.069392034, 22.476596989), (7.869392034, 22.130186827), (15.230607966, 17.880186827), (15.430607966, 18.226596989), align=None)
            Polygon((-8.069392034, -22.476596989), (-15.430607966, -18.226596989), (-15.230607966, -17.880186827), (-7.869392034, -22.130186827), align=None)
        extrude(amount=EXTRUDE_7_DEPTH)

    # Sketch 10 → Extrude 8 (add)
    with SkipClean():  # the faces are left unmerged after this step: merging them gives an invalid solid
        with BuildSketch(Plane(origin=(0, 14.4, 0), x_dir=(1, 0, 0), z_dir=(0, 1, 0))):
            Polygon((10.580865705, 21.026596989), (10.380865705, 20.680186827), (12.719134295, 19.330186827), (12.919134295, 19.676596989), align=None)
            Polygon((-10.580865705, -21.026596989), (-12.919134295, -19.676596989), (-12.719134295, -19.330186827), (-10.380865705, -20.680186827), align=None)
        extrude(amount=EXTRUDE_8_DEPTH)

    # Chamfer 1
    chamfer_1_edges = [part.edges().sort_by_distance(p)[0] for p in [
        (10.480865705, 21.4, -20.853391908),
        (12.819134295, 21.4, -19.503391908),
        (-10.480865705, 21.4, 20.853391908),
        (-12.819134295, 21.4, 19.503391908),
    ]]
    chamfer(chamfer_1_edges, length=CHAMFER_1_SIZE)

    # Sketch 11 → Revolve 1 (revolve)
    with SkipClean():  # the faces are left unmerged after this step: merging them gives an invalid solid
        with BuildSketch(Plane(origin=(0, 0, 0), x_dir=(0, 0, -1), z_dir=(1, 0, 0))):
            Polygon((20.5, 2.4), (17.5, 2.4), (4.99, 9.622651868), (4.99, 10.9), (15.74, 10.9), (15.74, 11.4), (-0.01, 11.4), (-0.01, 10.9), (4.49, 10.9), (4.49, 9.333976733), (17.366025404, 1.9), (20.5, 1.9), align=None)
        revolve(axis=Axis((0, 0, 0.01), (0, 1, 0)))

    # Sketch 13 → Cut-Extrude 4 (cut)
    with SkipClean():  # the faces are left unmerged after this step: merging them gives an invalid solid
        with BuildSketch(Plane.XZ):
            with Locations(Location((0, 0, 0), (0, 0, 270))):
                Circle(SKETCH_13_R)
        extrude(amount=-CUT_EXTRUDE_4_DEPTH, mode=Mode.SUBTRACT)

    # Sketch 15 → Extrude 10 (add)
    with SkipClean():  # the faces are left unmerged after this step: merging them gives an invalid solid
        with BuildSketch(Plane.XZ):
            with BuildLine():
                Line((-21.937410968, 5), (-22.75, 5))
                Line((-22.75, 5), (-22.75, -5))
                Line((-22.75, -5), (-21.937410968, -5))
                ThreePointArc((-21.937410968, -5), (-22.5, 0), (-21.937410968, 5))
            make_face()
            with BuildLine():
                Line((22.75, 5), (22.75, -5))
                Line((22.75, -5), (21.937410968, -5))
                ThreePointArc((21.937410968, -5), (22.5, 0), (21.937410968, 5))
                Line((21.937410968, 5), (22.75, 5))
            make_face()
        extrude(amount=-EXTRUDE_10_DEPTH)


solid = part.part
